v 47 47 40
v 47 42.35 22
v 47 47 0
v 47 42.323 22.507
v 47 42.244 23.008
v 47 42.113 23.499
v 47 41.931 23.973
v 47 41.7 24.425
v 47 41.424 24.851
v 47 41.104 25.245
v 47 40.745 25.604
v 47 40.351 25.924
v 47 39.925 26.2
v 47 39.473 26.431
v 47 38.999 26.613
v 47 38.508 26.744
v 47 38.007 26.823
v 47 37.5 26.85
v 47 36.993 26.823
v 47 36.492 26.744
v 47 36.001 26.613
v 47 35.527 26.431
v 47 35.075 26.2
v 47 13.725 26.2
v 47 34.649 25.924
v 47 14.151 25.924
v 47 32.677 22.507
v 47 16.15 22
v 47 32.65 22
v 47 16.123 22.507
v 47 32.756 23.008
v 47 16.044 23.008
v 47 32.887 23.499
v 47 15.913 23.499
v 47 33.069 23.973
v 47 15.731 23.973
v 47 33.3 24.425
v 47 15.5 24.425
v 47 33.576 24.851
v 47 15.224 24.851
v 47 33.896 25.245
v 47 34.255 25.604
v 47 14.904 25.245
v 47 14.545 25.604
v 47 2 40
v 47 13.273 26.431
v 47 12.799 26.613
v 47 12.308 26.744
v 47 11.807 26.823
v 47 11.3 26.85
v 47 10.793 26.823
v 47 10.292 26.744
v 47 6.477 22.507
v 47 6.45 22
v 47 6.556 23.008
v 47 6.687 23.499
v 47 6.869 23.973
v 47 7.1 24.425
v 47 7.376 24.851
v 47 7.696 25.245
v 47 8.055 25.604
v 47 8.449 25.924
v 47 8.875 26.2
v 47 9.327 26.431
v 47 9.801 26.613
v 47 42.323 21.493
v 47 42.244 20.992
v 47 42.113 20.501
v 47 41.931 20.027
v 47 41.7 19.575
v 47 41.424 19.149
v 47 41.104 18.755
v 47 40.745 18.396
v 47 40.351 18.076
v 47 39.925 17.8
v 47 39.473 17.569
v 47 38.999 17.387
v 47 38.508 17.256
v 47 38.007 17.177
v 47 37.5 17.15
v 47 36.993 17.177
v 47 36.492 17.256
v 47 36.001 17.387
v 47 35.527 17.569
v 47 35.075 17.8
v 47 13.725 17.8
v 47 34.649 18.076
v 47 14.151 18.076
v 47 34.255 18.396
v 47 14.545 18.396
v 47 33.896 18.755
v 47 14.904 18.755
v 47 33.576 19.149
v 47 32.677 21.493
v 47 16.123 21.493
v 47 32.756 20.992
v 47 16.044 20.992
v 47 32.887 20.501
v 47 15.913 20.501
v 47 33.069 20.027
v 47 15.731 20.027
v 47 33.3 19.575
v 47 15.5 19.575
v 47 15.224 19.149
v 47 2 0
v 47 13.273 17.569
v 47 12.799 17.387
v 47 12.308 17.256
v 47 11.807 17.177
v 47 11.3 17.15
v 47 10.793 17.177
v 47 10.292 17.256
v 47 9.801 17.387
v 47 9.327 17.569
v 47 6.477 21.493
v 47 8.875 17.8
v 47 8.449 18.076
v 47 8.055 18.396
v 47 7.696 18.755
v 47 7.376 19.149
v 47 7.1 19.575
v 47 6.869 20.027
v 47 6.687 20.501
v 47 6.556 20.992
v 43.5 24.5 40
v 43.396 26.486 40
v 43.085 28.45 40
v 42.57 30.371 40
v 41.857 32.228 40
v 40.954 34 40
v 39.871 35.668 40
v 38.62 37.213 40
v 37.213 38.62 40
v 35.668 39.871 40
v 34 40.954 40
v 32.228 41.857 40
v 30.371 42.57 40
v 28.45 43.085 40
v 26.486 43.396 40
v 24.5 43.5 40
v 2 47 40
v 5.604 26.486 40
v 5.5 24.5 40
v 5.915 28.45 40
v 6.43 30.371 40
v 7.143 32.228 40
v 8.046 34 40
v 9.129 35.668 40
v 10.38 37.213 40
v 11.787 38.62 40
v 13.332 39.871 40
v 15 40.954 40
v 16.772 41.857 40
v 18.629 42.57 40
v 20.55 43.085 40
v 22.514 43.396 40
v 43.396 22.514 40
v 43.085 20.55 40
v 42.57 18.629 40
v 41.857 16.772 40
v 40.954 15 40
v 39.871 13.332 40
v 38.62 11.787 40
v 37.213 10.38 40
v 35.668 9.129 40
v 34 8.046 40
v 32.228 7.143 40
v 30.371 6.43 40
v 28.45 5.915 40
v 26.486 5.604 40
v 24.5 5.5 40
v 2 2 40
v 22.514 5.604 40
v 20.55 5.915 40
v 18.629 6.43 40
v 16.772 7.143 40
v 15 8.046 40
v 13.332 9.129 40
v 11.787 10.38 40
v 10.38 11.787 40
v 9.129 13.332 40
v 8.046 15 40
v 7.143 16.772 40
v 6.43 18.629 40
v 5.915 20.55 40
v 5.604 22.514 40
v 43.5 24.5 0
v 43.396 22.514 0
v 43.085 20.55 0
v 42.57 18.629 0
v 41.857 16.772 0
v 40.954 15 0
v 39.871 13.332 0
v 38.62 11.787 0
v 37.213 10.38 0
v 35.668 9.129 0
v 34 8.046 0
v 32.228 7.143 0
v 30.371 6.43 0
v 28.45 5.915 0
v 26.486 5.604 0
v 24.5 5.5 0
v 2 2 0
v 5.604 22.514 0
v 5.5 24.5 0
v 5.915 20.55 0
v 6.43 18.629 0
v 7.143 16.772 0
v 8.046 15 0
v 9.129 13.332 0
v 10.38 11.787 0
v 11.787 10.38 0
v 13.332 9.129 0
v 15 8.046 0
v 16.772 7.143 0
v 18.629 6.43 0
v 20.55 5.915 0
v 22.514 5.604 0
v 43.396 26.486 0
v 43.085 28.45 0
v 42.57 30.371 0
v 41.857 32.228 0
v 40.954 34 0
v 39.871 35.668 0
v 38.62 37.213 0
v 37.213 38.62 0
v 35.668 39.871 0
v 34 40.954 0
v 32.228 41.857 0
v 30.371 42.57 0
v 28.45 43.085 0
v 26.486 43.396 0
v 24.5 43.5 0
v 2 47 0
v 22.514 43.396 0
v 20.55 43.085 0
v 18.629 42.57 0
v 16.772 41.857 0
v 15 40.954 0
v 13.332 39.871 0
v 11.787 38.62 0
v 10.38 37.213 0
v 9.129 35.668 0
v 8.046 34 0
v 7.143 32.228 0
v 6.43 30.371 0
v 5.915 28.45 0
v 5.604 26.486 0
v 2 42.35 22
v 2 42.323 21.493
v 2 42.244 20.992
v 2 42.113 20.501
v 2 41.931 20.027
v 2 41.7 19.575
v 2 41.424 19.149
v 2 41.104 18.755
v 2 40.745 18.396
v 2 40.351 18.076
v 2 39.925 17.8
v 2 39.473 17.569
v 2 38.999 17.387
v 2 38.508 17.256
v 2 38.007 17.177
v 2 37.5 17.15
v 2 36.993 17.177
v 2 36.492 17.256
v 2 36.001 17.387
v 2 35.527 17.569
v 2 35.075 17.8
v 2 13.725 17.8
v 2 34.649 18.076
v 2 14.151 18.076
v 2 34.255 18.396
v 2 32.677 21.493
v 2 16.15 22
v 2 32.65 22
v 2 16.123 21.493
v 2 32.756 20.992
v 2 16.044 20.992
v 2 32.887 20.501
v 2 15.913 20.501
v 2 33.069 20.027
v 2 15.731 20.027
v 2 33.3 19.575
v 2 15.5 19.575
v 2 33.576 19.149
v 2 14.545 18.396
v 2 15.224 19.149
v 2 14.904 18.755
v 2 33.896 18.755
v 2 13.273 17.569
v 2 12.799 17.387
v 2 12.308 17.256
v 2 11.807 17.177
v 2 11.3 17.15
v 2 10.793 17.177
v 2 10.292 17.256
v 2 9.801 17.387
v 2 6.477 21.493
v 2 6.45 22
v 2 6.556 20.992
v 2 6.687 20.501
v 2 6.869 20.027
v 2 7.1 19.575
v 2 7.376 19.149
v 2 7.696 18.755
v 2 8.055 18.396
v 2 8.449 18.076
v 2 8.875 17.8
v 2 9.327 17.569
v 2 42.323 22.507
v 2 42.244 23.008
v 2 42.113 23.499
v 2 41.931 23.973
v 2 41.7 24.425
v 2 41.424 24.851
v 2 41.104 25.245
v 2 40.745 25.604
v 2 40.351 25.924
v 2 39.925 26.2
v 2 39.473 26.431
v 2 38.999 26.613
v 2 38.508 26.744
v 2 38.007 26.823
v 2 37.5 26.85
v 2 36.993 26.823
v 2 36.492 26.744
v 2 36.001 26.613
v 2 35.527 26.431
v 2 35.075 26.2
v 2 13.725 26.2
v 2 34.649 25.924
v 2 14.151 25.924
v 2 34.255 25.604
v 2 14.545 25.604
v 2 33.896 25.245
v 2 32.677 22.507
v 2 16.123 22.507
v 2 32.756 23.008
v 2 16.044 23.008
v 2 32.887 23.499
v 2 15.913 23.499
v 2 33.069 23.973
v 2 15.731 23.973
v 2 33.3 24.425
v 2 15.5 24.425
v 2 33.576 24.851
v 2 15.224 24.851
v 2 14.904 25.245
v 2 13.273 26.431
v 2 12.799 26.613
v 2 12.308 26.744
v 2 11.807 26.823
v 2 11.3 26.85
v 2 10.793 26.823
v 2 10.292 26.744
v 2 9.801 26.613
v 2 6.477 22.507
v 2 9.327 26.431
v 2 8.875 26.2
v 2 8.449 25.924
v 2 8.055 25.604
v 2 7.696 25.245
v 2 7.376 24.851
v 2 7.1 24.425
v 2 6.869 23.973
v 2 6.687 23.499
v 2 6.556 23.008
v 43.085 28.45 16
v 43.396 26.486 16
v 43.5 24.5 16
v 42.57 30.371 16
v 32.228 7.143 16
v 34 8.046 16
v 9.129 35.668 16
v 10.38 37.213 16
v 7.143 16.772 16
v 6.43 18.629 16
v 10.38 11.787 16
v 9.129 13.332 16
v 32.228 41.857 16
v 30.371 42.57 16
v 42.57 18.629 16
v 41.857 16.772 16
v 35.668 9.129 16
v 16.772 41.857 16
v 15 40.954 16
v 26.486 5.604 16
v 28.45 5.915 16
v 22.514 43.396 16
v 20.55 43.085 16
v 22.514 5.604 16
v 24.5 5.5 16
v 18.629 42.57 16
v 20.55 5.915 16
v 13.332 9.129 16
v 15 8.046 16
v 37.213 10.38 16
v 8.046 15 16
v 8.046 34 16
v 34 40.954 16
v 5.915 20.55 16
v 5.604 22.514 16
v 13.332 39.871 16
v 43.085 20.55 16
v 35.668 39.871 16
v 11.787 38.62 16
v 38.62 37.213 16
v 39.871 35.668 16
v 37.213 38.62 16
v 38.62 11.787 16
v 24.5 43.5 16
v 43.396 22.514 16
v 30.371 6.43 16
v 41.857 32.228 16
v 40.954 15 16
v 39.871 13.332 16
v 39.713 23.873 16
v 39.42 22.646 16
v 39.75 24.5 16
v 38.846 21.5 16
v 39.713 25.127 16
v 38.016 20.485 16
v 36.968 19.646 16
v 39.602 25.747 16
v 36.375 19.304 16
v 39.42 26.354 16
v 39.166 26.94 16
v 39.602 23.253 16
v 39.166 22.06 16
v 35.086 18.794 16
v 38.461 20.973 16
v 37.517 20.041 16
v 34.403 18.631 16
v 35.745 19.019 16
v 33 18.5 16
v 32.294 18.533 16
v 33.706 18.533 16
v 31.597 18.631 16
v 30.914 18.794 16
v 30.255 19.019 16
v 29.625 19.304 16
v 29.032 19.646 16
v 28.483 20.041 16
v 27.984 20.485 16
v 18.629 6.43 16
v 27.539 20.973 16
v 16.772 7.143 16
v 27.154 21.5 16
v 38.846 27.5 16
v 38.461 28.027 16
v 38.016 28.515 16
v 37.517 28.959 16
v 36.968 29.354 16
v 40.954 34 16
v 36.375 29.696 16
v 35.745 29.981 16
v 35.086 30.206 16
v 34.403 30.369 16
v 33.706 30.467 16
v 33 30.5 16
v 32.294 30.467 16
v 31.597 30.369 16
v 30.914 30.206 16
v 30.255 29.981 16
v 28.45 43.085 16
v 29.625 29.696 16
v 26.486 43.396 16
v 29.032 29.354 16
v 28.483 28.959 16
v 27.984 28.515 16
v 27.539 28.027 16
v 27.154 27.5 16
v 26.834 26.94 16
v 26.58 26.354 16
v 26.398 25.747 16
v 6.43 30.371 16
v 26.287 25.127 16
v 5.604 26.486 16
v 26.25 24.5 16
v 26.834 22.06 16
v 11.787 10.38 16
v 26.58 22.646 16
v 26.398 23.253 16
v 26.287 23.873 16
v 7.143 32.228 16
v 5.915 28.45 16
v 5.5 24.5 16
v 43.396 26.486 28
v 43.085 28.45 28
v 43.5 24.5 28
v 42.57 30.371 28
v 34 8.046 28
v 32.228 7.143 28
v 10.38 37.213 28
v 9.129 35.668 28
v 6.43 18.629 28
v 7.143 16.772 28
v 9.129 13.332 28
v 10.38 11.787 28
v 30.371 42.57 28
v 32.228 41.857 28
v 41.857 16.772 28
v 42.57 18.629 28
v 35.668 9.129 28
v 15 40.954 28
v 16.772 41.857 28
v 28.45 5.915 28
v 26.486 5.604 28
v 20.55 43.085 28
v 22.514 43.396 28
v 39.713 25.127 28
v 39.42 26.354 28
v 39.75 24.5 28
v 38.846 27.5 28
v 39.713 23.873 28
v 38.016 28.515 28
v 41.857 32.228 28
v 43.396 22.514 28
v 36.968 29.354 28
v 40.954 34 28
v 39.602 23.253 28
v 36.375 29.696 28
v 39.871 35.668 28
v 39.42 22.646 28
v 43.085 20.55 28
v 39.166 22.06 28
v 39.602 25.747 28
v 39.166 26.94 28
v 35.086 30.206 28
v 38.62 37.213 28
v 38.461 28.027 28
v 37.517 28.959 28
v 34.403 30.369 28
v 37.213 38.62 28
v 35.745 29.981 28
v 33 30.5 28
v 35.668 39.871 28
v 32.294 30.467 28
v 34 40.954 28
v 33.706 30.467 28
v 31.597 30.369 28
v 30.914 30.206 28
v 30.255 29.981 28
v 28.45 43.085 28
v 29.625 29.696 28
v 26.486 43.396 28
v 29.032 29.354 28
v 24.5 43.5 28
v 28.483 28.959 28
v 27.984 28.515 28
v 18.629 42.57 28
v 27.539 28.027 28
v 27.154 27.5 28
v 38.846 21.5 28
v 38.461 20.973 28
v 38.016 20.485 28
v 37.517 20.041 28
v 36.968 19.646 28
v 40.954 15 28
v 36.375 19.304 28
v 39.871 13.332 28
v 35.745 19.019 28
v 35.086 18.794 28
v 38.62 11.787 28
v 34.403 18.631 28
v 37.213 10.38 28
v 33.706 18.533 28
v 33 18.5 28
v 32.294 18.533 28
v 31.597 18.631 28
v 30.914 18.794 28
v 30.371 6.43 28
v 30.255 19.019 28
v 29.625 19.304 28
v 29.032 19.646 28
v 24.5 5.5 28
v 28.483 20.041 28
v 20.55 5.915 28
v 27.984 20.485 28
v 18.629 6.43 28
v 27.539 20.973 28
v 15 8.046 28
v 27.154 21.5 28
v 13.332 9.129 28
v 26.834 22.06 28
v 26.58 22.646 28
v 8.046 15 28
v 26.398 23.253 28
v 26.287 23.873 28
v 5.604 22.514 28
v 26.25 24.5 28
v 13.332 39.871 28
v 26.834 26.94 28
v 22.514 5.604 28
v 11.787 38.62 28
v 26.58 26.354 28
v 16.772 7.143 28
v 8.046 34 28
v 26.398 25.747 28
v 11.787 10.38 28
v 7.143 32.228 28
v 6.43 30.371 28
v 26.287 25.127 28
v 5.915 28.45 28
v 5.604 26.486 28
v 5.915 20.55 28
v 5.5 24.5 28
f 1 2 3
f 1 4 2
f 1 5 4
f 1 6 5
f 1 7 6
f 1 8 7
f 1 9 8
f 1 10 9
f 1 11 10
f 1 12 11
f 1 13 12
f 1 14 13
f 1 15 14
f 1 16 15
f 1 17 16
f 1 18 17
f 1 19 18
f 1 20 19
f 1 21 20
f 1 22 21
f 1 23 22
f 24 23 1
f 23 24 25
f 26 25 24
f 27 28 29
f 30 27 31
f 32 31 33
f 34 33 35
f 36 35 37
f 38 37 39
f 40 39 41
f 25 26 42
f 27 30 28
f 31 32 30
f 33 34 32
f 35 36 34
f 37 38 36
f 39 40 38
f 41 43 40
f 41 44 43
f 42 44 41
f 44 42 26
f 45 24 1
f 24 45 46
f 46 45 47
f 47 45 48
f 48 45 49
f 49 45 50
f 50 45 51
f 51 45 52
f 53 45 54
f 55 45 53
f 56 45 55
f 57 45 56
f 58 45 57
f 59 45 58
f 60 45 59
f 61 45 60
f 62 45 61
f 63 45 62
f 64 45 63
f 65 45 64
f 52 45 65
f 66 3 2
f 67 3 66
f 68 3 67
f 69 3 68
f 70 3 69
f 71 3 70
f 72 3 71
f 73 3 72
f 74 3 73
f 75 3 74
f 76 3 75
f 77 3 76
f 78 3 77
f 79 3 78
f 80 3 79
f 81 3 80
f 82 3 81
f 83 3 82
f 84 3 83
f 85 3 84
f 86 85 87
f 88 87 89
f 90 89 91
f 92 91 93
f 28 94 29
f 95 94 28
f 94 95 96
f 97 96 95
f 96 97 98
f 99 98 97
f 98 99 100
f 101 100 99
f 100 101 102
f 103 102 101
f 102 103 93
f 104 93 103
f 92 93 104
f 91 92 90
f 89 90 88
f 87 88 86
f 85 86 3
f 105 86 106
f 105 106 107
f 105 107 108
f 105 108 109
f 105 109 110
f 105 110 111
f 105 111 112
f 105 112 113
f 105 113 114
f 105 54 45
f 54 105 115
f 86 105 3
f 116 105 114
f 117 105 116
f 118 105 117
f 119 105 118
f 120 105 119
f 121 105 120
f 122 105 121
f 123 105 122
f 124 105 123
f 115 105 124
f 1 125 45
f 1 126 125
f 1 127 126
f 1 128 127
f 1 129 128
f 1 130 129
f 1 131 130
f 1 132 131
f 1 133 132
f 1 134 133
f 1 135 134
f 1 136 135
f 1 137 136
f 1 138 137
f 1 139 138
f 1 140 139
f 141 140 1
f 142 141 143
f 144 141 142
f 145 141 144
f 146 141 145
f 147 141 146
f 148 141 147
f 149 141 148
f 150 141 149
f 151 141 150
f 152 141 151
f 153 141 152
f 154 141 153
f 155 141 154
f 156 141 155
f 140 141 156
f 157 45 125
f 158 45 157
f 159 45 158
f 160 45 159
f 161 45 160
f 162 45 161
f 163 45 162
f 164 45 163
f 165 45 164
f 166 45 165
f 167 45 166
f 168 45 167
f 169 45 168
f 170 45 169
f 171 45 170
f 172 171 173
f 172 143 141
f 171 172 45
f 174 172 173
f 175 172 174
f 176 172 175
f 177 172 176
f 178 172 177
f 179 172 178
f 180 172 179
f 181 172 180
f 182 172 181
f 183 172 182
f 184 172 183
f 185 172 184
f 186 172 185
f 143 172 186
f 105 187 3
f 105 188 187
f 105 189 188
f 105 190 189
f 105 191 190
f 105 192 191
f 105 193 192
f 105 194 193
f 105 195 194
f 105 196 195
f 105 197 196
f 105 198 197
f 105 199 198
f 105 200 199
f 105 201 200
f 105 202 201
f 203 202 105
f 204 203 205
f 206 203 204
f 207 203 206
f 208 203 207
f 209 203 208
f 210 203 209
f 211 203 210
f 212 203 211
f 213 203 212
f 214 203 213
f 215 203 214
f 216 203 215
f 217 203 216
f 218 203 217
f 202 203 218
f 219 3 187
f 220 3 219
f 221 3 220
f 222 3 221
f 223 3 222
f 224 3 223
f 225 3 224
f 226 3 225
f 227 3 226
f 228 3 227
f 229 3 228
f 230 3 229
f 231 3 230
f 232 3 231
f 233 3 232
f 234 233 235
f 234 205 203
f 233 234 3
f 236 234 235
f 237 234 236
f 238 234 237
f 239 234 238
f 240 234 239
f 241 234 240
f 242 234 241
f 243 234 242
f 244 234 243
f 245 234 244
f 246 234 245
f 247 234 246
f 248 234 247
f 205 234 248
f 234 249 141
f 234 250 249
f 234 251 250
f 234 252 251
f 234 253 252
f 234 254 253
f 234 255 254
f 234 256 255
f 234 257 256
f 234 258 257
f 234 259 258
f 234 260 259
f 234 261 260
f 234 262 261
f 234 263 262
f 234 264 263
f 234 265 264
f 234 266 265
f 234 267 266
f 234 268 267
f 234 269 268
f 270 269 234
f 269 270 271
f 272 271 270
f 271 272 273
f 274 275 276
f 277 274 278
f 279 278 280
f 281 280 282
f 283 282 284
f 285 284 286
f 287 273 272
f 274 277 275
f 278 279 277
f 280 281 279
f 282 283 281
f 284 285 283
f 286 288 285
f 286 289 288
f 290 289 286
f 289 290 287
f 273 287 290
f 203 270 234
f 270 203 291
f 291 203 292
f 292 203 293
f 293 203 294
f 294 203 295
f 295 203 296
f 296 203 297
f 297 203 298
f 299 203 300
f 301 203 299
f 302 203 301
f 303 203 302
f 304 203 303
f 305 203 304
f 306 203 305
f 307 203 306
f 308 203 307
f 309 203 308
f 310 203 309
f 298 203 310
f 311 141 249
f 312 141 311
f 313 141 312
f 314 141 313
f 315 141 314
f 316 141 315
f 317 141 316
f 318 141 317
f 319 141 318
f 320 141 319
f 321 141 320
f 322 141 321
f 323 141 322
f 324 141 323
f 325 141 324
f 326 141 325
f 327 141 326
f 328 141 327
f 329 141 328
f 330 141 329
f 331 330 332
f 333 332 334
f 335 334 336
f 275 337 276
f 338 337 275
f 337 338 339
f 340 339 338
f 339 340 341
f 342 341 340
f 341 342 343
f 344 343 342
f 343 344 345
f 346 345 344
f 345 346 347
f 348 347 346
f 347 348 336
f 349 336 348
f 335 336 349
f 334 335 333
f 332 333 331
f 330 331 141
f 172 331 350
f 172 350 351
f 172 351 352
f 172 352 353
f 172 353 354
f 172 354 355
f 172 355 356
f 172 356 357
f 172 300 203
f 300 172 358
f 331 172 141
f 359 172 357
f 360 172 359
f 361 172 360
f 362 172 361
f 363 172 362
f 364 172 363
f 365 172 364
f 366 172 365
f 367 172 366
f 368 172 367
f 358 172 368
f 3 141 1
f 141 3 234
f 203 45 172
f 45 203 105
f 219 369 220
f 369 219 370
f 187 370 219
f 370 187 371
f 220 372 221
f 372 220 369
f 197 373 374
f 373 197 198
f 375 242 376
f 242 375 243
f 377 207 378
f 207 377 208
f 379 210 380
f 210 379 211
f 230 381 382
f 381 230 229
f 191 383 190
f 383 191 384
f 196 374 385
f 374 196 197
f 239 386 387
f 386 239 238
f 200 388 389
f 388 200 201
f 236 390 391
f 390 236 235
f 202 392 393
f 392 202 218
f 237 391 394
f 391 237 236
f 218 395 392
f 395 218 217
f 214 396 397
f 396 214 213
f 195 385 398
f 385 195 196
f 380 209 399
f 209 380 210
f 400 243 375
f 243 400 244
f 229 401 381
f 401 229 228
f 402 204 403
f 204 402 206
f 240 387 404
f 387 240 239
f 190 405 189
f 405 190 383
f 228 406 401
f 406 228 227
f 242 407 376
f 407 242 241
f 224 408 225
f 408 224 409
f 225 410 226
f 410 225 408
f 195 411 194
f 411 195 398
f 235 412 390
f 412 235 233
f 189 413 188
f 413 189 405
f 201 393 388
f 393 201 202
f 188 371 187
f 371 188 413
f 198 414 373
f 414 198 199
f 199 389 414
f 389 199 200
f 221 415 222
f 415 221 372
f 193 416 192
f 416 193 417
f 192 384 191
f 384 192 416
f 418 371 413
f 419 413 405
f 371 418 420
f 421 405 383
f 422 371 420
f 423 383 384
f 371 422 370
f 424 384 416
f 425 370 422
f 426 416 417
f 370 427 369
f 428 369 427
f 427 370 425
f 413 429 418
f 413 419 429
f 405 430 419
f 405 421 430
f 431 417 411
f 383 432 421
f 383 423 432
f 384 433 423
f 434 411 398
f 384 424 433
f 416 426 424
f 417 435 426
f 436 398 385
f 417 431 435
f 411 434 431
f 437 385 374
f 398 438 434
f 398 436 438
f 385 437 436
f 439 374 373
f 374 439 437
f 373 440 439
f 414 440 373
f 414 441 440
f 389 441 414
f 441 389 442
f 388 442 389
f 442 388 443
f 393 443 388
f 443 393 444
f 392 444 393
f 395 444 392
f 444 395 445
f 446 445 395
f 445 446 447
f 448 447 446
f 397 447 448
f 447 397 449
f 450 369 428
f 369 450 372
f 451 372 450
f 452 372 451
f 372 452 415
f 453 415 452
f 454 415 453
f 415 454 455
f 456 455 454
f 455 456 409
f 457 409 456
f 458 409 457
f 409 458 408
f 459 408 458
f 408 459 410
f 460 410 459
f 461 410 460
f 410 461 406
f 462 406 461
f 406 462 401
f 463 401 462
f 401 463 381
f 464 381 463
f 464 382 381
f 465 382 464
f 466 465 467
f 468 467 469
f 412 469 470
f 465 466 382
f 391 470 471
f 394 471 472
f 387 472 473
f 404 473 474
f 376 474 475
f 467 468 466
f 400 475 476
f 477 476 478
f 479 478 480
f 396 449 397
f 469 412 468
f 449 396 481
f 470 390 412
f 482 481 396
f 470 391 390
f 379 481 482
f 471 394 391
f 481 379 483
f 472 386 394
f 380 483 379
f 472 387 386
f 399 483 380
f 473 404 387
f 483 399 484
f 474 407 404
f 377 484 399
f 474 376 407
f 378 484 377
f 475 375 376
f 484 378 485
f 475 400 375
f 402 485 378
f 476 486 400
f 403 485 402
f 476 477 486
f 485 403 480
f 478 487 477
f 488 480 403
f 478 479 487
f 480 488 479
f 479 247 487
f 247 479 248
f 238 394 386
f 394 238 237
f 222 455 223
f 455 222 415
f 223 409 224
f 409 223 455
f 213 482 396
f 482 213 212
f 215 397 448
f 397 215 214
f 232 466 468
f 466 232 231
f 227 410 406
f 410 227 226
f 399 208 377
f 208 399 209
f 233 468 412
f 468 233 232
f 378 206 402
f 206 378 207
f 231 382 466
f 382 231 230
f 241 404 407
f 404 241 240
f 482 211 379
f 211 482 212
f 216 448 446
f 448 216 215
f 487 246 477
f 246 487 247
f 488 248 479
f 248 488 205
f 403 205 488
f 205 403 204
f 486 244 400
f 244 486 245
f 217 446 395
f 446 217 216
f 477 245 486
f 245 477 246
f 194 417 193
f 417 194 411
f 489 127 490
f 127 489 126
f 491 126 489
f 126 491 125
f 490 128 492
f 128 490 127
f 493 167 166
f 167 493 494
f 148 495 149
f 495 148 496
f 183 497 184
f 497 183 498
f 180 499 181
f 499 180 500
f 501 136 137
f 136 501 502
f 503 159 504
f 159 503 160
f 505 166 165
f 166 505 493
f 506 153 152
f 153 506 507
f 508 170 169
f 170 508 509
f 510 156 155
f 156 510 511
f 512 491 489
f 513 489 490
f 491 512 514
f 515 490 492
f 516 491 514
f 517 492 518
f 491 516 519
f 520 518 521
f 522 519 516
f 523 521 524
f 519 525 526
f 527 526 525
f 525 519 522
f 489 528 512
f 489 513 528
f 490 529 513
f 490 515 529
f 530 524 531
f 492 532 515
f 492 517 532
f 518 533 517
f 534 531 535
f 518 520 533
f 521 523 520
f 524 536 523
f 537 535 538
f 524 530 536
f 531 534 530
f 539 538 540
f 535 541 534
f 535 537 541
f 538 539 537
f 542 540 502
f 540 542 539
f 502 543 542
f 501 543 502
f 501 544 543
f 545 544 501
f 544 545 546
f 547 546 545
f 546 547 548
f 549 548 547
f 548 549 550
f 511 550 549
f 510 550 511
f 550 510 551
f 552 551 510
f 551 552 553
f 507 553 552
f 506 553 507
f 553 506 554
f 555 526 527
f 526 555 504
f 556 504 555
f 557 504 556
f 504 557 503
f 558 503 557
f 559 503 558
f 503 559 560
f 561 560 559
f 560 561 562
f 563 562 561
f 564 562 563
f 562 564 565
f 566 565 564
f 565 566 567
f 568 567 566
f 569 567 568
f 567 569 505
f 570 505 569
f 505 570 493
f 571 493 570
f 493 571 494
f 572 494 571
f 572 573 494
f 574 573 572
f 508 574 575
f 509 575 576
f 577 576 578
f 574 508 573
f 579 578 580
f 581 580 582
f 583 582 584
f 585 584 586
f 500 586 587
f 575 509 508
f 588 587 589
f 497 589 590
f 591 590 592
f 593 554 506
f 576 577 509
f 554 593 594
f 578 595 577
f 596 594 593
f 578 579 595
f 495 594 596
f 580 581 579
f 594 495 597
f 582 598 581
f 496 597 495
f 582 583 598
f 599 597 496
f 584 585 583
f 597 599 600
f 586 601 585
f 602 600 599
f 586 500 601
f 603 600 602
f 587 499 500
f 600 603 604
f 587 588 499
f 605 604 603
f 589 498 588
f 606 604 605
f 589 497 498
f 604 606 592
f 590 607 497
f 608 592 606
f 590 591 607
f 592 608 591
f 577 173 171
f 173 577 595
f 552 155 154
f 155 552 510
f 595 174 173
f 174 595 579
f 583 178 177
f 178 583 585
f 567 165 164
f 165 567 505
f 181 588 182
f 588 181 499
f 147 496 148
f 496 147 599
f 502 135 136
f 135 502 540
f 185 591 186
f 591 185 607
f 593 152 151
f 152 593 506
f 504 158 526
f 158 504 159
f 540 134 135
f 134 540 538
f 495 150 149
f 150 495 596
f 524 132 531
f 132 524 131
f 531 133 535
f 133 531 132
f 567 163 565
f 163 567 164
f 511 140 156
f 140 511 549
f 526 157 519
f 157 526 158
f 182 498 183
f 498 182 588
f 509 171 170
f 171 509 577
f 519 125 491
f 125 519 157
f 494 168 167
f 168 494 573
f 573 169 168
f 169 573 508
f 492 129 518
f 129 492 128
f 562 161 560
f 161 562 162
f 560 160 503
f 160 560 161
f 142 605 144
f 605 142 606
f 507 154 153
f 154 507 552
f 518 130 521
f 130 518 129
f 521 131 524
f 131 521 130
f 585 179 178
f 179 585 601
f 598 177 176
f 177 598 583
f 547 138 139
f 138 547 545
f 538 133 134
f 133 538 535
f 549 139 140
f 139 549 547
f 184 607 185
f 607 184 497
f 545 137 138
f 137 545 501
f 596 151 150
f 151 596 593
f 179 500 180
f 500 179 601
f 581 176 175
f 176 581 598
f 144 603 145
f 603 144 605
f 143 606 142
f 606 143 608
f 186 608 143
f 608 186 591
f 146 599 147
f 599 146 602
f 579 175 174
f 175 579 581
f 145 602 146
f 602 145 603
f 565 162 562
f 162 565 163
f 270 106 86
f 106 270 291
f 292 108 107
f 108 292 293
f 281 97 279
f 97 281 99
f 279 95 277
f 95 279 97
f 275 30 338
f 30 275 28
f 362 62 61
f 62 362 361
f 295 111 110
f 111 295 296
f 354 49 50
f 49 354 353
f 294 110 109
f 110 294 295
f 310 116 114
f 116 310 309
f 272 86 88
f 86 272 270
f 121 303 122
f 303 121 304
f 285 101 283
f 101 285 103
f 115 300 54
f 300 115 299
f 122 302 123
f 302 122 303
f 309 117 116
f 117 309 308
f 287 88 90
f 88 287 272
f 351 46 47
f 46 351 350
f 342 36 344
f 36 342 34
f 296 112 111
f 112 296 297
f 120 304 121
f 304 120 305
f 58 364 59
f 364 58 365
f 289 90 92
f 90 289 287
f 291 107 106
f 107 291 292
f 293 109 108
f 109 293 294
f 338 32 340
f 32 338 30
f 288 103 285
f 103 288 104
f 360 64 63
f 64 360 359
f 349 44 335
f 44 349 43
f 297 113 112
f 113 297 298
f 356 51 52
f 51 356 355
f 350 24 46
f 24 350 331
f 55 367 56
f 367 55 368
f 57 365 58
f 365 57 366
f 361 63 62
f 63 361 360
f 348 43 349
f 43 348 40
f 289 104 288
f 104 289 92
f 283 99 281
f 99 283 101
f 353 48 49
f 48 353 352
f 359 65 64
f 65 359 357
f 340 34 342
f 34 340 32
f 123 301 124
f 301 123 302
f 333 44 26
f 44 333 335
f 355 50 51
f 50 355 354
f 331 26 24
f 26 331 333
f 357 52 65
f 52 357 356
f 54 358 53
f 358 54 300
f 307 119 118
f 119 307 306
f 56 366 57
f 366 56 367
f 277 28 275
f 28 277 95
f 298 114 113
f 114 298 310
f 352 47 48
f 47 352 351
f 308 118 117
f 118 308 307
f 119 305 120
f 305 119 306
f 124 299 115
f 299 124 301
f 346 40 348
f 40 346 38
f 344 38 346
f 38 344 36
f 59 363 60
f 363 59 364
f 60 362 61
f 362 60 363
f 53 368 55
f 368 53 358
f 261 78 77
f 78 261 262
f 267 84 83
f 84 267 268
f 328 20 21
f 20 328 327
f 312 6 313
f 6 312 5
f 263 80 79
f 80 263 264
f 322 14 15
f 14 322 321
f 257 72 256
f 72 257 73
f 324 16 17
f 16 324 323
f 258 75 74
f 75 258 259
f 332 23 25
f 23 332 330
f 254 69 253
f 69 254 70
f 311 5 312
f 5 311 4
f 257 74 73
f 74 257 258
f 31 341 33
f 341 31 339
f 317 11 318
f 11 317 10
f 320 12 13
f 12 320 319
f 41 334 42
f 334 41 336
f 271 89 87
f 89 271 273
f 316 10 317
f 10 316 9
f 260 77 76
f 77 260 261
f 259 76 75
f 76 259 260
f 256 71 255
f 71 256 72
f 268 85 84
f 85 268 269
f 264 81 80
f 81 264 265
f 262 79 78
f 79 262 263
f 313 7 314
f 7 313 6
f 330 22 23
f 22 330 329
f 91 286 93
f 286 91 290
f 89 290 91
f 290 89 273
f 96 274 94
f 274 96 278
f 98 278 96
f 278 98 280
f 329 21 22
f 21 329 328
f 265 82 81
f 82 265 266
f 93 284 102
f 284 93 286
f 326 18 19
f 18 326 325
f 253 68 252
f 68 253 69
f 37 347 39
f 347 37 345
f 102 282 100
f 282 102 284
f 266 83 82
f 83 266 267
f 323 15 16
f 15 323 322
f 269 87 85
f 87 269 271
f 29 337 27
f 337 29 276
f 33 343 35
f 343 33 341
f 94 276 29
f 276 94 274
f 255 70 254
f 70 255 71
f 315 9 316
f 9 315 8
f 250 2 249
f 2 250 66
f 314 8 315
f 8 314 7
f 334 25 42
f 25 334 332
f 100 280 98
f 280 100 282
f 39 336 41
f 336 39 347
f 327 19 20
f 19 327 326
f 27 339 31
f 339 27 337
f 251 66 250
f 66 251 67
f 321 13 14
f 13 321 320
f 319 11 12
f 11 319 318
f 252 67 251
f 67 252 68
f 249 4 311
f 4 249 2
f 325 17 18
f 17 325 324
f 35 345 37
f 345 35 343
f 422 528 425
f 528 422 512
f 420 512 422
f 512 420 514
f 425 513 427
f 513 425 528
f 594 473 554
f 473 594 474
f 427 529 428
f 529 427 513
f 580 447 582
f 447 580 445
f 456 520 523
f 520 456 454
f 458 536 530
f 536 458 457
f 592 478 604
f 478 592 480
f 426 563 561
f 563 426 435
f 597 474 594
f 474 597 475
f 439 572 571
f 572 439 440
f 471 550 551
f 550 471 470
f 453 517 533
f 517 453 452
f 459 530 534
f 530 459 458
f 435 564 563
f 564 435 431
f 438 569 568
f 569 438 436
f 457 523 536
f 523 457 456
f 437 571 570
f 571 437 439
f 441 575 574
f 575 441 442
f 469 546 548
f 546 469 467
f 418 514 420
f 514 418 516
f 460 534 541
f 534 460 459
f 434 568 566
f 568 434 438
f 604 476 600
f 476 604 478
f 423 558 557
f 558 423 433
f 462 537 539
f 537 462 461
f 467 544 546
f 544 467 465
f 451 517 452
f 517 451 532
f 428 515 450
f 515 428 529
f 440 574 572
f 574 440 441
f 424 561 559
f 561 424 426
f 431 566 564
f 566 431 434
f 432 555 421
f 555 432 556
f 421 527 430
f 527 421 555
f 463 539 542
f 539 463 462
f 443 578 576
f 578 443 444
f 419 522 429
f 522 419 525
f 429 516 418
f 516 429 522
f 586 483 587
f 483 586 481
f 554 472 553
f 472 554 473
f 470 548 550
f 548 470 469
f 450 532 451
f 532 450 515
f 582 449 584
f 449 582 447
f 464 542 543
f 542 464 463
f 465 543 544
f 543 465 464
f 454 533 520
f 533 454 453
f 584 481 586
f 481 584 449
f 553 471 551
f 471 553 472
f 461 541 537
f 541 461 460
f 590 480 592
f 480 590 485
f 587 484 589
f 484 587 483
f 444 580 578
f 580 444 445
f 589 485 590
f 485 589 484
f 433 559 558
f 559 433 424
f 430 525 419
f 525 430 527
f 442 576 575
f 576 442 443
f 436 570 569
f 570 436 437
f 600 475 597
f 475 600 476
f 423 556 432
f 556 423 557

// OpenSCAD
// ----------------------------------------------------
// Model: H-Profile Bracket / Motor Mounting Housing
// Based on SVG Slice Data Reconstruction
// Units: mm
// ----------------------------------------------------

$fn = 60; // 提高圆形/圆柱体渲染的平滑度

// 模块化构建主体
difference() {
    
    // 1. 总体外壳特征 (Square_Housing)
    // 根据切片数据边界点 (2.0 到 47.0)，计算出 45x45mm 的方形基底
    // 高度范围 (Z轴) 为 0 到 40mm
    translate([2, 2, 0]) 
        cube([45, 45, 40]); 

    // 2. 上下双空腔 (Dual_Cavity)，形成 H 型截面
    // 中间实体隔离板保留在 Z = 16mm 到 Z = 28mm 之间
    
    // 底部空腔 (Z = 0 到 16mm)
    // 预留 1mm 余量以确保完全挖穿底面
    translate([24.5, 24.5, -1]) 
        cylinder(h=17, d=38); 
        
    // 顶部空腔 (Z = 28mm 到 40mm)
    // 顶部同样留出挖空余量
    translate([24.5, 24.5, 28]) 
        cylinder(h=13, d=38); 

    // 3. 细小特征：两个水平贯穿孔 (Horizontal_Through_Holes)
    // 位于隔离板内部 (Z=22mm 处)，沿 X 轴贯穿整个壳体
    // 孔径 ~9.7mm (r=4.86)
    
    // 横向孔 1
    translate([-1, 11.3, 22]) 
        rotate([0, 90, 0]) 
        cylinder(h=55, d=9.7); 

    // 横向孔 2
    translate([-1, 37.5, 22]) 
        rotate([0, 90, 0]) 
        cylinder(h=55, d=9.7); 

    // 4. 细小特征：偏心垂直通孔 (Vertical_Offset_Hole)
    // 位于 X=33.0, Y=24.5，穿透中间的隔离板 (Z=16~28)
    // 尺寸约 13.5 x 12mm 的椭圆孔
    translate([33.0, 24.5, 15]) 
        scale([13.5/12, 1, 1]) // 拉伸形成椭圆
        cylinder(h=15, d=12); 
}
